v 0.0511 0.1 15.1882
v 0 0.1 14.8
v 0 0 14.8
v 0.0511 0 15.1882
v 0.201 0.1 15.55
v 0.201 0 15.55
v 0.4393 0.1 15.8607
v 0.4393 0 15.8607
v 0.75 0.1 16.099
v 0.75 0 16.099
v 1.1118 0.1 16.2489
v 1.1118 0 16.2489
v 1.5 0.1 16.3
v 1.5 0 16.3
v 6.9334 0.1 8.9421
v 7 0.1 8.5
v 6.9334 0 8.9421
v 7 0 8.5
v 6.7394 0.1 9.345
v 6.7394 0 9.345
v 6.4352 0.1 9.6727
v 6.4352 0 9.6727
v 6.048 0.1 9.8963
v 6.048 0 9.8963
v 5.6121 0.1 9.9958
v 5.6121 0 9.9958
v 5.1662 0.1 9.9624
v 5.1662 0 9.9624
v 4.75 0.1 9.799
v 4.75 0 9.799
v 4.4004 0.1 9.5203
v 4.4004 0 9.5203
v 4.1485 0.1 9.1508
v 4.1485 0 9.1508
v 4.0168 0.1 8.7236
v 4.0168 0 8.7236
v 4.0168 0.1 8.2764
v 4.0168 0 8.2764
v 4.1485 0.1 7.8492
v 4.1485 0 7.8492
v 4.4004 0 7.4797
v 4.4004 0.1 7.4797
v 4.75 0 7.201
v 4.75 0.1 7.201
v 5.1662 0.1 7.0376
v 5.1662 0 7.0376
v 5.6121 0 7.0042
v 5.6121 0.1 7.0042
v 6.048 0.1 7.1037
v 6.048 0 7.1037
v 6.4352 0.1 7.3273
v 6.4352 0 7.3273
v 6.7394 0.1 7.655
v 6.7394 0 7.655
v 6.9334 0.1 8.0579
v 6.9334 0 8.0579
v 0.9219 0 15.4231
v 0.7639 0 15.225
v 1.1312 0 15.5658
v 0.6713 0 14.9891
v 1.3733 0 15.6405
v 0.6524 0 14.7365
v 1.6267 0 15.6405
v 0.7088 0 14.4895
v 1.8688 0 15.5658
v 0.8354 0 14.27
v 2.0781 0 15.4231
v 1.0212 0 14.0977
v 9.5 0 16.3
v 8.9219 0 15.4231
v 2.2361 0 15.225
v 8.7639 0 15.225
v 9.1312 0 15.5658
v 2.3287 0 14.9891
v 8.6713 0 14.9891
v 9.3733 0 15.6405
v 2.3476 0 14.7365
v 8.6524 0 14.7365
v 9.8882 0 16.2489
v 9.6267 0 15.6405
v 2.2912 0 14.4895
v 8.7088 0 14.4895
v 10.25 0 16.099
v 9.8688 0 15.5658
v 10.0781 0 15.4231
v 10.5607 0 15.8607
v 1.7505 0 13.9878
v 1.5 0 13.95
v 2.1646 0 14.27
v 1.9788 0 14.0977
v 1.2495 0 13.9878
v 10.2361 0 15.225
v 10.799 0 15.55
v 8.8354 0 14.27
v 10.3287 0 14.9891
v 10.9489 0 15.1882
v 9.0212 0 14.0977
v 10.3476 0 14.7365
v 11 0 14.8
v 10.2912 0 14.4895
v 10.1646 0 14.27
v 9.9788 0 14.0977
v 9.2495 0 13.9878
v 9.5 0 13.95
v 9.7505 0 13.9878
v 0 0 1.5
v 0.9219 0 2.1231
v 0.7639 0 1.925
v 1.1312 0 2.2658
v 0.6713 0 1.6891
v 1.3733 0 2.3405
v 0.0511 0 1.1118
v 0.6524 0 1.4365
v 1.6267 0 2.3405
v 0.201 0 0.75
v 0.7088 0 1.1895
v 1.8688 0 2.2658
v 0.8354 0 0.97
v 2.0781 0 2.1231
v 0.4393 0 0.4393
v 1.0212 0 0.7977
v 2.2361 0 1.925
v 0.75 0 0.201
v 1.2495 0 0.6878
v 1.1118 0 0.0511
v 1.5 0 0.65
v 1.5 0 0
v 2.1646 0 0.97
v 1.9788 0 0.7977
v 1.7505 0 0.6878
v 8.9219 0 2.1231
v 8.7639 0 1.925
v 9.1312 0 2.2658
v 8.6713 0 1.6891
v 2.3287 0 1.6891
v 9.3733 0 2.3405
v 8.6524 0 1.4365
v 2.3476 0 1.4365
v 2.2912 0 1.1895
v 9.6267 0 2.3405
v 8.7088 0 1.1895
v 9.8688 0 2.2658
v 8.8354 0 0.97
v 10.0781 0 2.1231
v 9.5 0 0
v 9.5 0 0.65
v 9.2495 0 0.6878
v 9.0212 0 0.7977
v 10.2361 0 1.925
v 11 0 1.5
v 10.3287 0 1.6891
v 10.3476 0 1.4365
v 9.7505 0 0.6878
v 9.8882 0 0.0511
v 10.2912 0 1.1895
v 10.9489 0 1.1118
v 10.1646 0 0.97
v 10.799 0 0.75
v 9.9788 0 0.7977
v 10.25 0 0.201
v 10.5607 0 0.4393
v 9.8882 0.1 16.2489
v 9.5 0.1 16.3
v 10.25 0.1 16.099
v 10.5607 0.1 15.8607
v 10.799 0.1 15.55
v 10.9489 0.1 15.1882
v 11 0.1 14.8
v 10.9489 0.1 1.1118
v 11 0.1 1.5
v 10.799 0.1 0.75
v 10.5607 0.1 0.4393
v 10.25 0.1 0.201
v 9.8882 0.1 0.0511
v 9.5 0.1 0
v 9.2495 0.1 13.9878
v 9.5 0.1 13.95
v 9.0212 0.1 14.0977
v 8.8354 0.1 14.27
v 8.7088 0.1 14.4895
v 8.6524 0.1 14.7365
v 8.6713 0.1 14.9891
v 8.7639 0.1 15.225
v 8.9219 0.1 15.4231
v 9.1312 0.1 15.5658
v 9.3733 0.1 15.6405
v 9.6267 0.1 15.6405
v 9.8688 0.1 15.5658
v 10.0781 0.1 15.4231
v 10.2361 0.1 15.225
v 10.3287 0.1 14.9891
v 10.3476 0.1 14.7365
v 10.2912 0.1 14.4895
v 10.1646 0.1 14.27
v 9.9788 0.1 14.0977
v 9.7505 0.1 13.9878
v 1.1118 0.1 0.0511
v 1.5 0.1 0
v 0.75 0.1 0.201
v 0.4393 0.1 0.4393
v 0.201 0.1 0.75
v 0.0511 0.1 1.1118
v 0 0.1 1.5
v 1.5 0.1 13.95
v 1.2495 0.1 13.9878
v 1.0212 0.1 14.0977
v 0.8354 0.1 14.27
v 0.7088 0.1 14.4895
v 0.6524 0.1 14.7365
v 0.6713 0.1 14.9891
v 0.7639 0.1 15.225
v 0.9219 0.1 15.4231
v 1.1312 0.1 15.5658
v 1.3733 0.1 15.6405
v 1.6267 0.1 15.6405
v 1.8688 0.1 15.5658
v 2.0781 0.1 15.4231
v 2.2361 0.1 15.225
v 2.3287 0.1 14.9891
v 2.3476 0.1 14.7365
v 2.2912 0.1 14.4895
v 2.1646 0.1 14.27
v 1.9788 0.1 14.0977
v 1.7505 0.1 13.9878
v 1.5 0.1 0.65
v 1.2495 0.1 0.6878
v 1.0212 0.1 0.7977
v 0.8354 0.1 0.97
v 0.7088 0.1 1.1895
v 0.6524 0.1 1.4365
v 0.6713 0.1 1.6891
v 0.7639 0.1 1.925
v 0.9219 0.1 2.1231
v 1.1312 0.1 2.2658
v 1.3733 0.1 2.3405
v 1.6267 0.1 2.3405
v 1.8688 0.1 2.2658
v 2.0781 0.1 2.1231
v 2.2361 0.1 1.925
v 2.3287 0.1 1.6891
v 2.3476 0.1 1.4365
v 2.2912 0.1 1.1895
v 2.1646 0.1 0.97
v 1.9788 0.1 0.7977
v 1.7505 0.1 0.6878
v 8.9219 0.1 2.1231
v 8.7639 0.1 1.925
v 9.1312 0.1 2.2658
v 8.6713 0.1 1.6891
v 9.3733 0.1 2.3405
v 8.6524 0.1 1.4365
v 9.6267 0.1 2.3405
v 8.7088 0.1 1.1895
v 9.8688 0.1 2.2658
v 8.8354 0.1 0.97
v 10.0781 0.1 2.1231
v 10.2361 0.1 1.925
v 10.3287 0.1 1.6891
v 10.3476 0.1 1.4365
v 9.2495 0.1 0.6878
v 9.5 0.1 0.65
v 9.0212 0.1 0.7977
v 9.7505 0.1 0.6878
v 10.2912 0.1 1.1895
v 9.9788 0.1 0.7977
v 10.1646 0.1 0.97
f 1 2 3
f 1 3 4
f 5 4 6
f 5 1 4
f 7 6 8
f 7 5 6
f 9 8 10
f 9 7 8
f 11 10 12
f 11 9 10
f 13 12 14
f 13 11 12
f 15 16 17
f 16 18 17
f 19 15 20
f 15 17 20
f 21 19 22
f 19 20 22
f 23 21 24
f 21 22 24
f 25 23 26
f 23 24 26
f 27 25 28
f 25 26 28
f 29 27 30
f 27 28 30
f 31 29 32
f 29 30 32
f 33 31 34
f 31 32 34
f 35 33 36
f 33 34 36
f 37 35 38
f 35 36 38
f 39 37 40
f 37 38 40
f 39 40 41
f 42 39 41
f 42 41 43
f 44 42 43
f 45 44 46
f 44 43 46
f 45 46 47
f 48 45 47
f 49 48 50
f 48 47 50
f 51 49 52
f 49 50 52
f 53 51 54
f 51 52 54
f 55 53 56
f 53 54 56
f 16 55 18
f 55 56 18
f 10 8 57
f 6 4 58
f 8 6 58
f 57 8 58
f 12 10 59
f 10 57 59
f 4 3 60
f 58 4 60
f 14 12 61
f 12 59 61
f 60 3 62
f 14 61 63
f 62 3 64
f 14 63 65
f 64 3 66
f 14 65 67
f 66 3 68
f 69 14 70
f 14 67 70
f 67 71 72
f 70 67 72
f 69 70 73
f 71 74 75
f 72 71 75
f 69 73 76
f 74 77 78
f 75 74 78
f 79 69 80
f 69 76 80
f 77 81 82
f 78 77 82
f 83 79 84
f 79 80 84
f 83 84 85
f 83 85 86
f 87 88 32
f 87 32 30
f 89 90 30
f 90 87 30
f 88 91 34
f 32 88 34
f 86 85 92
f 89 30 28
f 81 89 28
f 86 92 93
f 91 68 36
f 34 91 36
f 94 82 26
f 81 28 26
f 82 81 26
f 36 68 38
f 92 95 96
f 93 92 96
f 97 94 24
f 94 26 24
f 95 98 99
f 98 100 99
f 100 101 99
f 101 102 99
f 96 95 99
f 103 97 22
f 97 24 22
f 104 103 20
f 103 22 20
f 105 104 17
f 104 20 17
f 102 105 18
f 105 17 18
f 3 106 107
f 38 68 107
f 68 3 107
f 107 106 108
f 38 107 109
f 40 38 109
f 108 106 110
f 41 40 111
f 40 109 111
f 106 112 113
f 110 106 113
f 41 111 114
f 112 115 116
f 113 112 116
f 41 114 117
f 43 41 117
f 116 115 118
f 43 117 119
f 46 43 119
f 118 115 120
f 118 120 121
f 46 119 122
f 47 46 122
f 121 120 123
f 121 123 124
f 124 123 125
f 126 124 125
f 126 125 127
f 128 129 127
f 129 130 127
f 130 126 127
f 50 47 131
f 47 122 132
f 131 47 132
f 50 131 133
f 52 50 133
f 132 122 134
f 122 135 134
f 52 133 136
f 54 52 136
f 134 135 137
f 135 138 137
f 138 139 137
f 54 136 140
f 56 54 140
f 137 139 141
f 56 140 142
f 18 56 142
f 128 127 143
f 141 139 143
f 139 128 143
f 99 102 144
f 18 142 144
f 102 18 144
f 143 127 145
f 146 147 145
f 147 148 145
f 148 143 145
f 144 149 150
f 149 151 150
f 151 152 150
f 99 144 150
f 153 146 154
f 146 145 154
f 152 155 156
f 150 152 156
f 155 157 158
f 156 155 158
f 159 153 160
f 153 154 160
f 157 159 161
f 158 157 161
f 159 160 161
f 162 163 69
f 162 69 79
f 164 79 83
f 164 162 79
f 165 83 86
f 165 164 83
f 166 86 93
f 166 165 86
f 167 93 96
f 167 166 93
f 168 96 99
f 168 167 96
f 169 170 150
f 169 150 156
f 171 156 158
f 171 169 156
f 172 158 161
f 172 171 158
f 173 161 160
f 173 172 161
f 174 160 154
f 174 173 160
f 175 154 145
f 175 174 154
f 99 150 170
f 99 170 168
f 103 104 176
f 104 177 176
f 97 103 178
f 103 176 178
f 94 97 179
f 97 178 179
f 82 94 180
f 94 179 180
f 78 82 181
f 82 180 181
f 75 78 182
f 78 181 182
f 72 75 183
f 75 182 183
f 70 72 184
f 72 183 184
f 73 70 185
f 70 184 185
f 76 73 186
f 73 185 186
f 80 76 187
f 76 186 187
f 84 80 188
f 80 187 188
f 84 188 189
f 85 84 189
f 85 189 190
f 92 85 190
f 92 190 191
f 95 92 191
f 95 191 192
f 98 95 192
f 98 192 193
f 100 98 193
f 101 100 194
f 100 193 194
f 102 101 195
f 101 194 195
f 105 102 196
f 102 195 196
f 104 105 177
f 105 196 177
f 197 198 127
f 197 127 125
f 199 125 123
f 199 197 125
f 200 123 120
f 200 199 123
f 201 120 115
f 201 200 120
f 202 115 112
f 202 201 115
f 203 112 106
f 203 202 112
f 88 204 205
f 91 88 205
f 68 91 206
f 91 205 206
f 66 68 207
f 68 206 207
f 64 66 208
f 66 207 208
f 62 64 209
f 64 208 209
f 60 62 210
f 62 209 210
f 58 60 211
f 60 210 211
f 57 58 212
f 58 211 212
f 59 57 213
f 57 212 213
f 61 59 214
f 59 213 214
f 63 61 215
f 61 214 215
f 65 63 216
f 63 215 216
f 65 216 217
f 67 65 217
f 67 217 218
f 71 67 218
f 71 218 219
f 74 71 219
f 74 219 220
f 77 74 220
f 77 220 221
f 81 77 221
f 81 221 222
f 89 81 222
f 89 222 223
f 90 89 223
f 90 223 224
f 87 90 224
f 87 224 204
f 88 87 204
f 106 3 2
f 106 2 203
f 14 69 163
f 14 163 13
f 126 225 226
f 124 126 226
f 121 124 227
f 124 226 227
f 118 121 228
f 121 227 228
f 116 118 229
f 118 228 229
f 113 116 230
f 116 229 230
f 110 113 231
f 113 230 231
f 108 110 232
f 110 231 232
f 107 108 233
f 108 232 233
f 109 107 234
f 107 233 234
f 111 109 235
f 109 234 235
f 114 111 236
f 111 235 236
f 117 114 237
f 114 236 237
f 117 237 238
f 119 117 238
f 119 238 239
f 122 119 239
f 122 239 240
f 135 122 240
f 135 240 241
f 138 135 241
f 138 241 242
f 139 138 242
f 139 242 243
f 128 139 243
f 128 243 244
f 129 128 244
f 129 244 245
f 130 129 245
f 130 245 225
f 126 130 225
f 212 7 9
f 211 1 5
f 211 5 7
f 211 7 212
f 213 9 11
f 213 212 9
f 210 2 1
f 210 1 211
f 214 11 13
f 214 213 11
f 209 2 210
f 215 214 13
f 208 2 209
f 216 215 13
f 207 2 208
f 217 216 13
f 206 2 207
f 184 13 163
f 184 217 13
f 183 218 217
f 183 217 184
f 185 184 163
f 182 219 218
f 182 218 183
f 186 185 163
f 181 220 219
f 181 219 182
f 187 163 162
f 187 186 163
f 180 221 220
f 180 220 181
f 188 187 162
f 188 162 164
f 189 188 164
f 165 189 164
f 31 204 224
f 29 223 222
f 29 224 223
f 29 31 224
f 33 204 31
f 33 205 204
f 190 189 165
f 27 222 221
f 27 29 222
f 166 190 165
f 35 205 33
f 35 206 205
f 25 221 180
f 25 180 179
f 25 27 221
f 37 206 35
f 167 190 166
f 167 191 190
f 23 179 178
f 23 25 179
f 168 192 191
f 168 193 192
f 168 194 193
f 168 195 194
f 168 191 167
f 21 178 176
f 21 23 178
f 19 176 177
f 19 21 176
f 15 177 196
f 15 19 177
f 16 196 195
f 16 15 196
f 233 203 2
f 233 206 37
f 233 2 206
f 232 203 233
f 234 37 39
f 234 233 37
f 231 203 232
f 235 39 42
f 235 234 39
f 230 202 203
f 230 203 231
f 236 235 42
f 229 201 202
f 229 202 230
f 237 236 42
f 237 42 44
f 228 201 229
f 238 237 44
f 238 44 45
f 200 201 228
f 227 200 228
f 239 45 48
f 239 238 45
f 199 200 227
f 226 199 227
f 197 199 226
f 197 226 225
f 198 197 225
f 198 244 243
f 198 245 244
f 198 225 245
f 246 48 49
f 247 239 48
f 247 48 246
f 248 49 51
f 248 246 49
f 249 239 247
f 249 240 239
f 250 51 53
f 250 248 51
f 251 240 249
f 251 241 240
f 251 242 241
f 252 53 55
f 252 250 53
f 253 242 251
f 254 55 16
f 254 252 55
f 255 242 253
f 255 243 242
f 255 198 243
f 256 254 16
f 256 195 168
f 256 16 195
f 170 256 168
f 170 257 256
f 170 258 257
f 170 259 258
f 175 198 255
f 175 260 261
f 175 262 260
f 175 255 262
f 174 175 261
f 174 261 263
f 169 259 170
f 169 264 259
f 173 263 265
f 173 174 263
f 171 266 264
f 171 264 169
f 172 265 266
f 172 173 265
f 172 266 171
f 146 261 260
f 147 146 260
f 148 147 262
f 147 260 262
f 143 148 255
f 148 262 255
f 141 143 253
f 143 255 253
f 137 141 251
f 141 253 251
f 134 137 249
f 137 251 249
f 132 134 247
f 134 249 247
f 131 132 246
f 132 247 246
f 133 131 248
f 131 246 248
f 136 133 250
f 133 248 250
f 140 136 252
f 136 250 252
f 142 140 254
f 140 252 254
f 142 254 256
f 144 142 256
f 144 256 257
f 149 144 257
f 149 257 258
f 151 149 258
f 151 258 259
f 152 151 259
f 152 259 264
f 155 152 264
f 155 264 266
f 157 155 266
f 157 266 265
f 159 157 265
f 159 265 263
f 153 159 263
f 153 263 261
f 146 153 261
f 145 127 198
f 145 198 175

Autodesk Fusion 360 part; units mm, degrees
sketch "Sketch1" plane through (0, 0, 0) normal (0, 1, 0) x (1, 0, 0)
  line L0 (0, 0) -> (11, 0)
  line L1 (11, 0) -> (11, -16.3)
  line L2 (11, -16.3) -> (0, -16.3)
  line L3 (0, -16.3) -> (0, 0)
  line L4 (1.5, -14.8) -> (1.5, -1.5) construction
  line L5 (1.5, -1.5) -> (9.5, -1.5) construction
  line L6 (9.5, -1.5) -> (9.5, -14.8) construction
  line L7 (9.5, -14.8) -> (1.5, -14.8) construction
  circle A0 centre (5.5, -8.5) radius 1.5
  line L8 (5.5, -14.8) -> (5.5, -8.5) construction
  point P0 (1.5, -1.5)
  point P1 (9.5, -1.5)
  point P2 (9.5, -14.8)
  point P3 (1.5, -14.8)
  dimension "d1" = 16.3
  dimension "d2" = 11
  dimension "d3" = 1.5
  dimension "d4" = 6.3
  dimension "d5" = 3
extrude "Extrude1" add sketch "Sketch1" along normal blind 0.1
hole "Hole1" at (1.5, 0, 14.8) at (1.5, 0, 1.5) at (9.5, 0, 1.5) at (9.5, 0, 14.8) direction (0, 1, 0) diameter 1.7 depth 12 tip angle 118
fillet "Fillet1" radius 1.5 4 edges at (11, 0.05, 16.3) (0, 0.05, 16.3) (0, 0.05, 0) (11, 0.05, 0)
equation "d1 = 11.3 mm + 5 mm"
equation "d2 = 8 mm + 3 mm"
